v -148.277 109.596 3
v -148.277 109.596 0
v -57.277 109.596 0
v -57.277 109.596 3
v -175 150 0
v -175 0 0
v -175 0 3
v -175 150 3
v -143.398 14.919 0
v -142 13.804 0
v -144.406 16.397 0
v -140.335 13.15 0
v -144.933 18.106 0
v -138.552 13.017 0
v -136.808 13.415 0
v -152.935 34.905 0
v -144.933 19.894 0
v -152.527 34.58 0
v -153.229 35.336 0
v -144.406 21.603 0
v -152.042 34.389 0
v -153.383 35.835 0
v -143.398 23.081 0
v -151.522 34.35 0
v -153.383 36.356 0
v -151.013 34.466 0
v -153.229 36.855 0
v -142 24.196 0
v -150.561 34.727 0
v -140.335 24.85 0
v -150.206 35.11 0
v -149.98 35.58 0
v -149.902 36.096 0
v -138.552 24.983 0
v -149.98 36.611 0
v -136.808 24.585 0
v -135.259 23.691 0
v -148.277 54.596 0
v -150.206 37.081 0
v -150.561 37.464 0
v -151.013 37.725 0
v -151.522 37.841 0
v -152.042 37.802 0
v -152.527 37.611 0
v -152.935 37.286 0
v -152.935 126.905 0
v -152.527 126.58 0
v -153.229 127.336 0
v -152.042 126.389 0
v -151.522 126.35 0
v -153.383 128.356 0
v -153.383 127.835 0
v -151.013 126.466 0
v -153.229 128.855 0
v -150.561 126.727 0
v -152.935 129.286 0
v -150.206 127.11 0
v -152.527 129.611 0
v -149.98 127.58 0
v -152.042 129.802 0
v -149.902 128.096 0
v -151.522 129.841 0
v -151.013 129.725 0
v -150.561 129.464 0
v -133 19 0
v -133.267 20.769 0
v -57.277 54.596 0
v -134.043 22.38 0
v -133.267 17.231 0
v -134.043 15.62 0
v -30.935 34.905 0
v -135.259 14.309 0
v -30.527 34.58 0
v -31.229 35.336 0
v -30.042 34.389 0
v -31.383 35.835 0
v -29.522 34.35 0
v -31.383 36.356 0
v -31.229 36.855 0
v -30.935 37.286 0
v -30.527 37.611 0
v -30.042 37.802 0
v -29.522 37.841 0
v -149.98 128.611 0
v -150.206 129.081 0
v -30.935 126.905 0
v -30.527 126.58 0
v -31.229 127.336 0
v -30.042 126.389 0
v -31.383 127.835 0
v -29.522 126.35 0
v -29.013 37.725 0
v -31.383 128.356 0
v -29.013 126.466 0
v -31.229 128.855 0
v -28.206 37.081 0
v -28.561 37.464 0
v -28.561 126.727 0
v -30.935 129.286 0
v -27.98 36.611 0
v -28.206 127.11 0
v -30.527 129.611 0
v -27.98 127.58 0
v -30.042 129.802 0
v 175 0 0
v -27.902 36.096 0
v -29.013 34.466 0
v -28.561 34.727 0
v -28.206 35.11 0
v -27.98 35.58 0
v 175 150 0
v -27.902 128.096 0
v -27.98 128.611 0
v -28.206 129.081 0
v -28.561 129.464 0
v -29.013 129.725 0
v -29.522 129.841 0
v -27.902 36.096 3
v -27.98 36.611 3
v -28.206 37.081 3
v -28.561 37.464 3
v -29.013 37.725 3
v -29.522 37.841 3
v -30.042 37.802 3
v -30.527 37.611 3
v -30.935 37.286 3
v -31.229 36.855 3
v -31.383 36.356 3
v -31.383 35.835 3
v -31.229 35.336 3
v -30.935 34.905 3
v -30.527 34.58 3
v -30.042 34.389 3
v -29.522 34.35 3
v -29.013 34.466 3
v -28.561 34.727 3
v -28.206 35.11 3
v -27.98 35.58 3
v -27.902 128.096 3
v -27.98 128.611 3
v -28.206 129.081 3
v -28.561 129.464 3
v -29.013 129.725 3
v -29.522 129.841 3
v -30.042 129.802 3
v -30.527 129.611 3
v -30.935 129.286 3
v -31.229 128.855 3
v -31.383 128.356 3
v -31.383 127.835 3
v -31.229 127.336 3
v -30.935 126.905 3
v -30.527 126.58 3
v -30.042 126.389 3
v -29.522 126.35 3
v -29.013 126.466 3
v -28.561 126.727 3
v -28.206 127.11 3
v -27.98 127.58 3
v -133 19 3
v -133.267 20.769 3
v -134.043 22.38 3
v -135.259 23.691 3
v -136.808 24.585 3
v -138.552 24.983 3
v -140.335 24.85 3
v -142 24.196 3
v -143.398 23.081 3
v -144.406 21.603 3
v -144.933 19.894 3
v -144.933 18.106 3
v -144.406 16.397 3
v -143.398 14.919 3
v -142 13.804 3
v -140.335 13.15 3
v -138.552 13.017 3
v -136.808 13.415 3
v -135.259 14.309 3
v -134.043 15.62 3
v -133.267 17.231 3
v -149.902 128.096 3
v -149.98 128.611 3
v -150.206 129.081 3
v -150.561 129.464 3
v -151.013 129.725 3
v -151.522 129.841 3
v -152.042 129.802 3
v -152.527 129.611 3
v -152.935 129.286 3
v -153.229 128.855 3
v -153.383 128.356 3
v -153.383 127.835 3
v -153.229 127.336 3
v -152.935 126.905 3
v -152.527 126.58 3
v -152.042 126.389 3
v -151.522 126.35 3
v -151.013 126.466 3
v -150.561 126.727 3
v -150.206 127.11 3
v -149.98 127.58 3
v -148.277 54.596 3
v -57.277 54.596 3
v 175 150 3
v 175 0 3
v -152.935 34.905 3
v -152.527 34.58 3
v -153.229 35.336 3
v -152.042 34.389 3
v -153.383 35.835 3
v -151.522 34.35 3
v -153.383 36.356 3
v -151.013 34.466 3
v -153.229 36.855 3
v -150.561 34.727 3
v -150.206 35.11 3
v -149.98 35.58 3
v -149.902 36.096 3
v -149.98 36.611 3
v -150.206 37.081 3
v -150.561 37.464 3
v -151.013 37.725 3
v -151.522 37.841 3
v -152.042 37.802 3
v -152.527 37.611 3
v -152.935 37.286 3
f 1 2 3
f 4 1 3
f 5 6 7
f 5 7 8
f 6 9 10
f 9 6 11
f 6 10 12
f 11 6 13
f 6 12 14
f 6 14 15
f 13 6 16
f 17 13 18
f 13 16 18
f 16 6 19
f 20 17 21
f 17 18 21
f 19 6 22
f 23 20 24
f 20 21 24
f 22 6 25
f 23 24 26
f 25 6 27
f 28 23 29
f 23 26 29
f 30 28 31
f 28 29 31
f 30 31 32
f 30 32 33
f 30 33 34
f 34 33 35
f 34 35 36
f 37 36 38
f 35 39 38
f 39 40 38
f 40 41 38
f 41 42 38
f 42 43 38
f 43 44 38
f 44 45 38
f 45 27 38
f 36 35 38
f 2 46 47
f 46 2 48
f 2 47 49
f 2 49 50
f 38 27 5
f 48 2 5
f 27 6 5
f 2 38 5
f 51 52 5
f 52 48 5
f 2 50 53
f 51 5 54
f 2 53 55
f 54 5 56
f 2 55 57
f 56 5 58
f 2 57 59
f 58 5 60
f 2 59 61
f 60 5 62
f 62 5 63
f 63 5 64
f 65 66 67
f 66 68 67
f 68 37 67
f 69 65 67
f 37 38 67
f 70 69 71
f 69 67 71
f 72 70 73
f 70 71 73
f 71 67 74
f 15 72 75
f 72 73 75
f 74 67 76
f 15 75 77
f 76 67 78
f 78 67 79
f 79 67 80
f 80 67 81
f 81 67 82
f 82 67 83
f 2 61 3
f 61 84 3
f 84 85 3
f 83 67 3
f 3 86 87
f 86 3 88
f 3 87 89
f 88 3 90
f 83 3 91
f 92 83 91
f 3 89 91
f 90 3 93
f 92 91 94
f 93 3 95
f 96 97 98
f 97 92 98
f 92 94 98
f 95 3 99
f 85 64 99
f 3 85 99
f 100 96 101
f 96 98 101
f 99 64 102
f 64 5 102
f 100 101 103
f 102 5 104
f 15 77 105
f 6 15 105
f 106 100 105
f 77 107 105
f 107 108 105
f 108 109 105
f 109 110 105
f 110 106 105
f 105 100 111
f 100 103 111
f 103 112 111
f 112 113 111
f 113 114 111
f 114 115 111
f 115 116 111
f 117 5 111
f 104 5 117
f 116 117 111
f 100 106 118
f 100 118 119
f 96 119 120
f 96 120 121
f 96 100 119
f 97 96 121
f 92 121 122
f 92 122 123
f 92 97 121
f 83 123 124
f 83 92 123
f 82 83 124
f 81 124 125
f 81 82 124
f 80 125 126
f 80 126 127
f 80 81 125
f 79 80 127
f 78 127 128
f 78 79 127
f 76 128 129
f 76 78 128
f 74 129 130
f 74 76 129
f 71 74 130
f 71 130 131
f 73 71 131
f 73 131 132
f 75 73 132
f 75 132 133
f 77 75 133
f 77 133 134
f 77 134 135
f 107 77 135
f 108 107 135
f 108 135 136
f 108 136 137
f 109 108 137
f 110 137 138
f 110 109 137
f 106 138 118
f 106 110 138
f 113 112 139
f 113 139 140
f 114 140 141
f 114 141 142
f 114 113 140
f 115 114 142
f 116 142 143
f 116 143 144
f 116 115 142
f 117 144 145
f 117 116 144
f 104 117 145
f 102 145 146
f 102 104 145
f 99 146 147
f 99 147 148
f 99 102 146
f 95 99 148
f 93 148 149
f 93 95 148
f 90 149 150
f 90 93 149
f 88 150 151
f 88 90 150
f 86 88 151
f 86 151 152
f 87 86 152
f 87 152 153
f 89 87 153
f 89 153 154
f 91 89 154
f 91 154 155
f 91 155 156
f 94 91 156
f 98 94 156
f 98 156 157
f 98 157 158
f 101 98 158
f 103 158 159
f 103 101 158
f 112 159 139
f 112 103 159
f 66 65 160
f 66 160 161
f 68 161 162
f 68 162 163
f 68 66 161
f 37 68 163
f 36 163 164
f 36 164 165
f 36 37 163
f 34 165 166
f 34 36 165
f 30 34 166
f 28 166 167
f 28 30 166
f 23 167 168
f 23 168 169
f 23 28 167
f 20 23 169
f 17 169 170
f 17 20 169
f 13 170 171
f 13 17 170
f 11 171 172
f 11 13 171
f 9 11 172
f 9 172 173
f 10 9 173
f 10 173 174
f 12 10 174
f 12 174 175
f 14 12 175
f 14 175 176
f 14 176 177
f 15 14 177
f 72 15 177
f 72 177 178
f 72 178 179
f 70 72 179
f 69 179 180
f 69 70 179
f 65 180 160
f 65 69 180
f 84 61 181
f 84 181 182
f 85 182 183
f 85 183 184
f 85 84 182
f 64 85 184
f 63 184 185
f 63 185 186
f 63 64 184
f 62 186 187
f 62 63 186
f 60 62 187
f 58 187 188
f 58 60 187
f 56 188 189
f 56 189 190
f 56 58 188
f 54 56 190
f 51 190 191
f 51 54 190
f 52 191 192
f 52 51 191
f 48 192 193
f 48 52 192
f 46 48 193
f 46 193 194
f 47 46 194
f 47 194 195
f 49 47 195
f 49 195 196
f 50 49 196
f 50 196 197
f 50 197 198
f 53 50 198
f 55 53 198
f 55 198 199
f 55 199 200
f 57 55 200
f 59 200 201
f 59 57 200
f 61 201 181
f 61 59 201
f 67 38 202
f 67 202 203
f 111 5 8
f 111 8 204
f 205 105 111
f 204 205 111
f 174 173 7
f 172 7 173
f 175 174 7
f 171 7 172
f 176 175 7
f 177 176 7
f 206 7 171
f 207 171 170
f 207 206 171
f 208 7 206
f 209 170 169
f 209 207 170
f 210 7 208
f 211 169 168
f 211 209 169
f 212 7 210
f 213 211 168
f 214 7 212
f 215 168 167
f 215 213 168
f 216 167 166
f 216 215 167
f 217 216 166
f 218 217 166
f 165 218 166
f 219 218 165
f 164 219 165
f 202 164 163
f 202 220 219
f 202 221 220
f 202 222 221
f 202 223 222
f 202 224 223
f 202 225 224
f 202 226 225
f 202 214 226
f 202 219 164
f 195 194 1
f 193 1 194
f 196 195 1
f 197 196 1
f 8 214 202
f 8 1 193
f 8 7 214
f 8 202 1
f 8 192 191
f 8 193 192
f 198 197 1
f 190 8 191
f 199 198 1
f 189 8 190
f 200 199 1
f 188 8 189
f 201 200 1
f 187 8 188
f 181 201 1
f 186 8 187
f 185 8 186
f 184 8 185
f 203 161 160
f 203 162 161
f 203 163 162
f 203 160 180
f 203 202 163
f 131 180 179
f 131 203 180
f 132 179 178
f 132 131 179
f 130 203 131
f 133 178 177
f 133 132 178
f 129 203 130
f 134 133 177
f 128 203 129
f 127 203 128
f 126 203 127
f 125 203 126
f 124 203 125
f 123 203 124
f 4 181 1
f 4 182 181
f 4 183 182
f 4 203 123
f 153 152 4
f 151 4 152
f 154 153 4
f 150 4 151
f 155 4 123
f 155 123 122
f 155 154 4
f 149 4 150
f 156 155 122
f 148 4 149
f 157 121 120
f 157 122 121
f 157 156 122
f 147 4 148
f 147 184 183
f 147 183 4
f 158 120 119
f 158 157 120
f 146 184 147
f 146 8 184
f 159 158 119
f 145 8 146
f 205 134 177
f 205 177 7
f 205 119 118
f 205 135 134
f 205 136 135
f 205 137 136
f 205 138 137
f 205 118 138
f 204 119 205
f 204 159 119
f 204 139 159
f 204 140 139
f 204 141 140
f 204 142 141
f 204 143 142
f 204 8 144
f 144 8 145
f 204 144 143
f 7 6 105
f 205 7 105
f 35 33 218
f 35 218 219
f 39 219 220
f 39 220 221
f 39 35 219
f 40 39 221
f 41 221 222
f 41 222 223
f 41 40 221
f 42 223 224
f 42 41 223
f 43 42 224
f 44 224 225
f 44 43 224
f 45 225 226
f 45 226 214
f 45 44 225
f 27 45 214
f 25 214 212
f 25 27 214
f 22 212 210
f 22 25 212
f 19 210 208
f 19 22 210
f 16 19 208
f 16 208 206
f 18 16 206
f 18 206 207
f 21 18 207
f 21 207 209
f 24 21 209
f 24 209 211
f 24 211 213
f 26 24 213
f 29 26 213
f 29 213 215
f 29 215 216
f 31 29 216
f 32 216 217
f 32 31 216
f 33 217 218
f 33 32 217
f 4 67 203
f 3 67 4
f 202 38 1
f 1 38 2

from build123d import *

# Parameters (mm, degrees)
SKETCH_1_W      = 350
SKETCH_1_H      = 150
SKETCH_1_R      = 1.75
SKETCH_1_R_2    = 6
SKETCH_1_W_2    = 91
SKETCH_1_H_2    = 55
EXTRUDE_1_DEPTH = 3


with BuildPart() as part:
    # 草图1 → 凸台-拉伸1 (new body)
    with BuildSketch(Plane.XY):
        with Locations((0, 75)):
            Rectangle(SKETCH_1_W, SKETCH_1_H)
        with Locations((-151.652414134, 128.095526692)):
            Circle(SKETCH_1_R, mode=Mode.SUBTRACT)
        with Locations((-29.652414134, 128.095526692)):
            Circle(SKETCH_1_R, mode=Mode.SUBTRACT)
        with Locations((-29.652414134, 36.095526692)):
            Circle(SKETCH_1_R, mode=Mode.SUBTRACT)
        with Locations((-151.652414134, 36.095526692)):
            Circle(SKETCH_1_R, mode=Mode.SUBTRACT)
        with Locations((-139, 19)):
            Circle(SKETCH_1_R_2, mode=Mode.SUBTRACT)
        with Locations((-102.777414134, 82.095526692)):
            Rectangle(SKETCH_1_W_2, SKETCH_1_H_2, mode=Mode.SUBTRACT)
    extrude(amount=EXTRUDE_1_DEPTH)


solid = part.part
